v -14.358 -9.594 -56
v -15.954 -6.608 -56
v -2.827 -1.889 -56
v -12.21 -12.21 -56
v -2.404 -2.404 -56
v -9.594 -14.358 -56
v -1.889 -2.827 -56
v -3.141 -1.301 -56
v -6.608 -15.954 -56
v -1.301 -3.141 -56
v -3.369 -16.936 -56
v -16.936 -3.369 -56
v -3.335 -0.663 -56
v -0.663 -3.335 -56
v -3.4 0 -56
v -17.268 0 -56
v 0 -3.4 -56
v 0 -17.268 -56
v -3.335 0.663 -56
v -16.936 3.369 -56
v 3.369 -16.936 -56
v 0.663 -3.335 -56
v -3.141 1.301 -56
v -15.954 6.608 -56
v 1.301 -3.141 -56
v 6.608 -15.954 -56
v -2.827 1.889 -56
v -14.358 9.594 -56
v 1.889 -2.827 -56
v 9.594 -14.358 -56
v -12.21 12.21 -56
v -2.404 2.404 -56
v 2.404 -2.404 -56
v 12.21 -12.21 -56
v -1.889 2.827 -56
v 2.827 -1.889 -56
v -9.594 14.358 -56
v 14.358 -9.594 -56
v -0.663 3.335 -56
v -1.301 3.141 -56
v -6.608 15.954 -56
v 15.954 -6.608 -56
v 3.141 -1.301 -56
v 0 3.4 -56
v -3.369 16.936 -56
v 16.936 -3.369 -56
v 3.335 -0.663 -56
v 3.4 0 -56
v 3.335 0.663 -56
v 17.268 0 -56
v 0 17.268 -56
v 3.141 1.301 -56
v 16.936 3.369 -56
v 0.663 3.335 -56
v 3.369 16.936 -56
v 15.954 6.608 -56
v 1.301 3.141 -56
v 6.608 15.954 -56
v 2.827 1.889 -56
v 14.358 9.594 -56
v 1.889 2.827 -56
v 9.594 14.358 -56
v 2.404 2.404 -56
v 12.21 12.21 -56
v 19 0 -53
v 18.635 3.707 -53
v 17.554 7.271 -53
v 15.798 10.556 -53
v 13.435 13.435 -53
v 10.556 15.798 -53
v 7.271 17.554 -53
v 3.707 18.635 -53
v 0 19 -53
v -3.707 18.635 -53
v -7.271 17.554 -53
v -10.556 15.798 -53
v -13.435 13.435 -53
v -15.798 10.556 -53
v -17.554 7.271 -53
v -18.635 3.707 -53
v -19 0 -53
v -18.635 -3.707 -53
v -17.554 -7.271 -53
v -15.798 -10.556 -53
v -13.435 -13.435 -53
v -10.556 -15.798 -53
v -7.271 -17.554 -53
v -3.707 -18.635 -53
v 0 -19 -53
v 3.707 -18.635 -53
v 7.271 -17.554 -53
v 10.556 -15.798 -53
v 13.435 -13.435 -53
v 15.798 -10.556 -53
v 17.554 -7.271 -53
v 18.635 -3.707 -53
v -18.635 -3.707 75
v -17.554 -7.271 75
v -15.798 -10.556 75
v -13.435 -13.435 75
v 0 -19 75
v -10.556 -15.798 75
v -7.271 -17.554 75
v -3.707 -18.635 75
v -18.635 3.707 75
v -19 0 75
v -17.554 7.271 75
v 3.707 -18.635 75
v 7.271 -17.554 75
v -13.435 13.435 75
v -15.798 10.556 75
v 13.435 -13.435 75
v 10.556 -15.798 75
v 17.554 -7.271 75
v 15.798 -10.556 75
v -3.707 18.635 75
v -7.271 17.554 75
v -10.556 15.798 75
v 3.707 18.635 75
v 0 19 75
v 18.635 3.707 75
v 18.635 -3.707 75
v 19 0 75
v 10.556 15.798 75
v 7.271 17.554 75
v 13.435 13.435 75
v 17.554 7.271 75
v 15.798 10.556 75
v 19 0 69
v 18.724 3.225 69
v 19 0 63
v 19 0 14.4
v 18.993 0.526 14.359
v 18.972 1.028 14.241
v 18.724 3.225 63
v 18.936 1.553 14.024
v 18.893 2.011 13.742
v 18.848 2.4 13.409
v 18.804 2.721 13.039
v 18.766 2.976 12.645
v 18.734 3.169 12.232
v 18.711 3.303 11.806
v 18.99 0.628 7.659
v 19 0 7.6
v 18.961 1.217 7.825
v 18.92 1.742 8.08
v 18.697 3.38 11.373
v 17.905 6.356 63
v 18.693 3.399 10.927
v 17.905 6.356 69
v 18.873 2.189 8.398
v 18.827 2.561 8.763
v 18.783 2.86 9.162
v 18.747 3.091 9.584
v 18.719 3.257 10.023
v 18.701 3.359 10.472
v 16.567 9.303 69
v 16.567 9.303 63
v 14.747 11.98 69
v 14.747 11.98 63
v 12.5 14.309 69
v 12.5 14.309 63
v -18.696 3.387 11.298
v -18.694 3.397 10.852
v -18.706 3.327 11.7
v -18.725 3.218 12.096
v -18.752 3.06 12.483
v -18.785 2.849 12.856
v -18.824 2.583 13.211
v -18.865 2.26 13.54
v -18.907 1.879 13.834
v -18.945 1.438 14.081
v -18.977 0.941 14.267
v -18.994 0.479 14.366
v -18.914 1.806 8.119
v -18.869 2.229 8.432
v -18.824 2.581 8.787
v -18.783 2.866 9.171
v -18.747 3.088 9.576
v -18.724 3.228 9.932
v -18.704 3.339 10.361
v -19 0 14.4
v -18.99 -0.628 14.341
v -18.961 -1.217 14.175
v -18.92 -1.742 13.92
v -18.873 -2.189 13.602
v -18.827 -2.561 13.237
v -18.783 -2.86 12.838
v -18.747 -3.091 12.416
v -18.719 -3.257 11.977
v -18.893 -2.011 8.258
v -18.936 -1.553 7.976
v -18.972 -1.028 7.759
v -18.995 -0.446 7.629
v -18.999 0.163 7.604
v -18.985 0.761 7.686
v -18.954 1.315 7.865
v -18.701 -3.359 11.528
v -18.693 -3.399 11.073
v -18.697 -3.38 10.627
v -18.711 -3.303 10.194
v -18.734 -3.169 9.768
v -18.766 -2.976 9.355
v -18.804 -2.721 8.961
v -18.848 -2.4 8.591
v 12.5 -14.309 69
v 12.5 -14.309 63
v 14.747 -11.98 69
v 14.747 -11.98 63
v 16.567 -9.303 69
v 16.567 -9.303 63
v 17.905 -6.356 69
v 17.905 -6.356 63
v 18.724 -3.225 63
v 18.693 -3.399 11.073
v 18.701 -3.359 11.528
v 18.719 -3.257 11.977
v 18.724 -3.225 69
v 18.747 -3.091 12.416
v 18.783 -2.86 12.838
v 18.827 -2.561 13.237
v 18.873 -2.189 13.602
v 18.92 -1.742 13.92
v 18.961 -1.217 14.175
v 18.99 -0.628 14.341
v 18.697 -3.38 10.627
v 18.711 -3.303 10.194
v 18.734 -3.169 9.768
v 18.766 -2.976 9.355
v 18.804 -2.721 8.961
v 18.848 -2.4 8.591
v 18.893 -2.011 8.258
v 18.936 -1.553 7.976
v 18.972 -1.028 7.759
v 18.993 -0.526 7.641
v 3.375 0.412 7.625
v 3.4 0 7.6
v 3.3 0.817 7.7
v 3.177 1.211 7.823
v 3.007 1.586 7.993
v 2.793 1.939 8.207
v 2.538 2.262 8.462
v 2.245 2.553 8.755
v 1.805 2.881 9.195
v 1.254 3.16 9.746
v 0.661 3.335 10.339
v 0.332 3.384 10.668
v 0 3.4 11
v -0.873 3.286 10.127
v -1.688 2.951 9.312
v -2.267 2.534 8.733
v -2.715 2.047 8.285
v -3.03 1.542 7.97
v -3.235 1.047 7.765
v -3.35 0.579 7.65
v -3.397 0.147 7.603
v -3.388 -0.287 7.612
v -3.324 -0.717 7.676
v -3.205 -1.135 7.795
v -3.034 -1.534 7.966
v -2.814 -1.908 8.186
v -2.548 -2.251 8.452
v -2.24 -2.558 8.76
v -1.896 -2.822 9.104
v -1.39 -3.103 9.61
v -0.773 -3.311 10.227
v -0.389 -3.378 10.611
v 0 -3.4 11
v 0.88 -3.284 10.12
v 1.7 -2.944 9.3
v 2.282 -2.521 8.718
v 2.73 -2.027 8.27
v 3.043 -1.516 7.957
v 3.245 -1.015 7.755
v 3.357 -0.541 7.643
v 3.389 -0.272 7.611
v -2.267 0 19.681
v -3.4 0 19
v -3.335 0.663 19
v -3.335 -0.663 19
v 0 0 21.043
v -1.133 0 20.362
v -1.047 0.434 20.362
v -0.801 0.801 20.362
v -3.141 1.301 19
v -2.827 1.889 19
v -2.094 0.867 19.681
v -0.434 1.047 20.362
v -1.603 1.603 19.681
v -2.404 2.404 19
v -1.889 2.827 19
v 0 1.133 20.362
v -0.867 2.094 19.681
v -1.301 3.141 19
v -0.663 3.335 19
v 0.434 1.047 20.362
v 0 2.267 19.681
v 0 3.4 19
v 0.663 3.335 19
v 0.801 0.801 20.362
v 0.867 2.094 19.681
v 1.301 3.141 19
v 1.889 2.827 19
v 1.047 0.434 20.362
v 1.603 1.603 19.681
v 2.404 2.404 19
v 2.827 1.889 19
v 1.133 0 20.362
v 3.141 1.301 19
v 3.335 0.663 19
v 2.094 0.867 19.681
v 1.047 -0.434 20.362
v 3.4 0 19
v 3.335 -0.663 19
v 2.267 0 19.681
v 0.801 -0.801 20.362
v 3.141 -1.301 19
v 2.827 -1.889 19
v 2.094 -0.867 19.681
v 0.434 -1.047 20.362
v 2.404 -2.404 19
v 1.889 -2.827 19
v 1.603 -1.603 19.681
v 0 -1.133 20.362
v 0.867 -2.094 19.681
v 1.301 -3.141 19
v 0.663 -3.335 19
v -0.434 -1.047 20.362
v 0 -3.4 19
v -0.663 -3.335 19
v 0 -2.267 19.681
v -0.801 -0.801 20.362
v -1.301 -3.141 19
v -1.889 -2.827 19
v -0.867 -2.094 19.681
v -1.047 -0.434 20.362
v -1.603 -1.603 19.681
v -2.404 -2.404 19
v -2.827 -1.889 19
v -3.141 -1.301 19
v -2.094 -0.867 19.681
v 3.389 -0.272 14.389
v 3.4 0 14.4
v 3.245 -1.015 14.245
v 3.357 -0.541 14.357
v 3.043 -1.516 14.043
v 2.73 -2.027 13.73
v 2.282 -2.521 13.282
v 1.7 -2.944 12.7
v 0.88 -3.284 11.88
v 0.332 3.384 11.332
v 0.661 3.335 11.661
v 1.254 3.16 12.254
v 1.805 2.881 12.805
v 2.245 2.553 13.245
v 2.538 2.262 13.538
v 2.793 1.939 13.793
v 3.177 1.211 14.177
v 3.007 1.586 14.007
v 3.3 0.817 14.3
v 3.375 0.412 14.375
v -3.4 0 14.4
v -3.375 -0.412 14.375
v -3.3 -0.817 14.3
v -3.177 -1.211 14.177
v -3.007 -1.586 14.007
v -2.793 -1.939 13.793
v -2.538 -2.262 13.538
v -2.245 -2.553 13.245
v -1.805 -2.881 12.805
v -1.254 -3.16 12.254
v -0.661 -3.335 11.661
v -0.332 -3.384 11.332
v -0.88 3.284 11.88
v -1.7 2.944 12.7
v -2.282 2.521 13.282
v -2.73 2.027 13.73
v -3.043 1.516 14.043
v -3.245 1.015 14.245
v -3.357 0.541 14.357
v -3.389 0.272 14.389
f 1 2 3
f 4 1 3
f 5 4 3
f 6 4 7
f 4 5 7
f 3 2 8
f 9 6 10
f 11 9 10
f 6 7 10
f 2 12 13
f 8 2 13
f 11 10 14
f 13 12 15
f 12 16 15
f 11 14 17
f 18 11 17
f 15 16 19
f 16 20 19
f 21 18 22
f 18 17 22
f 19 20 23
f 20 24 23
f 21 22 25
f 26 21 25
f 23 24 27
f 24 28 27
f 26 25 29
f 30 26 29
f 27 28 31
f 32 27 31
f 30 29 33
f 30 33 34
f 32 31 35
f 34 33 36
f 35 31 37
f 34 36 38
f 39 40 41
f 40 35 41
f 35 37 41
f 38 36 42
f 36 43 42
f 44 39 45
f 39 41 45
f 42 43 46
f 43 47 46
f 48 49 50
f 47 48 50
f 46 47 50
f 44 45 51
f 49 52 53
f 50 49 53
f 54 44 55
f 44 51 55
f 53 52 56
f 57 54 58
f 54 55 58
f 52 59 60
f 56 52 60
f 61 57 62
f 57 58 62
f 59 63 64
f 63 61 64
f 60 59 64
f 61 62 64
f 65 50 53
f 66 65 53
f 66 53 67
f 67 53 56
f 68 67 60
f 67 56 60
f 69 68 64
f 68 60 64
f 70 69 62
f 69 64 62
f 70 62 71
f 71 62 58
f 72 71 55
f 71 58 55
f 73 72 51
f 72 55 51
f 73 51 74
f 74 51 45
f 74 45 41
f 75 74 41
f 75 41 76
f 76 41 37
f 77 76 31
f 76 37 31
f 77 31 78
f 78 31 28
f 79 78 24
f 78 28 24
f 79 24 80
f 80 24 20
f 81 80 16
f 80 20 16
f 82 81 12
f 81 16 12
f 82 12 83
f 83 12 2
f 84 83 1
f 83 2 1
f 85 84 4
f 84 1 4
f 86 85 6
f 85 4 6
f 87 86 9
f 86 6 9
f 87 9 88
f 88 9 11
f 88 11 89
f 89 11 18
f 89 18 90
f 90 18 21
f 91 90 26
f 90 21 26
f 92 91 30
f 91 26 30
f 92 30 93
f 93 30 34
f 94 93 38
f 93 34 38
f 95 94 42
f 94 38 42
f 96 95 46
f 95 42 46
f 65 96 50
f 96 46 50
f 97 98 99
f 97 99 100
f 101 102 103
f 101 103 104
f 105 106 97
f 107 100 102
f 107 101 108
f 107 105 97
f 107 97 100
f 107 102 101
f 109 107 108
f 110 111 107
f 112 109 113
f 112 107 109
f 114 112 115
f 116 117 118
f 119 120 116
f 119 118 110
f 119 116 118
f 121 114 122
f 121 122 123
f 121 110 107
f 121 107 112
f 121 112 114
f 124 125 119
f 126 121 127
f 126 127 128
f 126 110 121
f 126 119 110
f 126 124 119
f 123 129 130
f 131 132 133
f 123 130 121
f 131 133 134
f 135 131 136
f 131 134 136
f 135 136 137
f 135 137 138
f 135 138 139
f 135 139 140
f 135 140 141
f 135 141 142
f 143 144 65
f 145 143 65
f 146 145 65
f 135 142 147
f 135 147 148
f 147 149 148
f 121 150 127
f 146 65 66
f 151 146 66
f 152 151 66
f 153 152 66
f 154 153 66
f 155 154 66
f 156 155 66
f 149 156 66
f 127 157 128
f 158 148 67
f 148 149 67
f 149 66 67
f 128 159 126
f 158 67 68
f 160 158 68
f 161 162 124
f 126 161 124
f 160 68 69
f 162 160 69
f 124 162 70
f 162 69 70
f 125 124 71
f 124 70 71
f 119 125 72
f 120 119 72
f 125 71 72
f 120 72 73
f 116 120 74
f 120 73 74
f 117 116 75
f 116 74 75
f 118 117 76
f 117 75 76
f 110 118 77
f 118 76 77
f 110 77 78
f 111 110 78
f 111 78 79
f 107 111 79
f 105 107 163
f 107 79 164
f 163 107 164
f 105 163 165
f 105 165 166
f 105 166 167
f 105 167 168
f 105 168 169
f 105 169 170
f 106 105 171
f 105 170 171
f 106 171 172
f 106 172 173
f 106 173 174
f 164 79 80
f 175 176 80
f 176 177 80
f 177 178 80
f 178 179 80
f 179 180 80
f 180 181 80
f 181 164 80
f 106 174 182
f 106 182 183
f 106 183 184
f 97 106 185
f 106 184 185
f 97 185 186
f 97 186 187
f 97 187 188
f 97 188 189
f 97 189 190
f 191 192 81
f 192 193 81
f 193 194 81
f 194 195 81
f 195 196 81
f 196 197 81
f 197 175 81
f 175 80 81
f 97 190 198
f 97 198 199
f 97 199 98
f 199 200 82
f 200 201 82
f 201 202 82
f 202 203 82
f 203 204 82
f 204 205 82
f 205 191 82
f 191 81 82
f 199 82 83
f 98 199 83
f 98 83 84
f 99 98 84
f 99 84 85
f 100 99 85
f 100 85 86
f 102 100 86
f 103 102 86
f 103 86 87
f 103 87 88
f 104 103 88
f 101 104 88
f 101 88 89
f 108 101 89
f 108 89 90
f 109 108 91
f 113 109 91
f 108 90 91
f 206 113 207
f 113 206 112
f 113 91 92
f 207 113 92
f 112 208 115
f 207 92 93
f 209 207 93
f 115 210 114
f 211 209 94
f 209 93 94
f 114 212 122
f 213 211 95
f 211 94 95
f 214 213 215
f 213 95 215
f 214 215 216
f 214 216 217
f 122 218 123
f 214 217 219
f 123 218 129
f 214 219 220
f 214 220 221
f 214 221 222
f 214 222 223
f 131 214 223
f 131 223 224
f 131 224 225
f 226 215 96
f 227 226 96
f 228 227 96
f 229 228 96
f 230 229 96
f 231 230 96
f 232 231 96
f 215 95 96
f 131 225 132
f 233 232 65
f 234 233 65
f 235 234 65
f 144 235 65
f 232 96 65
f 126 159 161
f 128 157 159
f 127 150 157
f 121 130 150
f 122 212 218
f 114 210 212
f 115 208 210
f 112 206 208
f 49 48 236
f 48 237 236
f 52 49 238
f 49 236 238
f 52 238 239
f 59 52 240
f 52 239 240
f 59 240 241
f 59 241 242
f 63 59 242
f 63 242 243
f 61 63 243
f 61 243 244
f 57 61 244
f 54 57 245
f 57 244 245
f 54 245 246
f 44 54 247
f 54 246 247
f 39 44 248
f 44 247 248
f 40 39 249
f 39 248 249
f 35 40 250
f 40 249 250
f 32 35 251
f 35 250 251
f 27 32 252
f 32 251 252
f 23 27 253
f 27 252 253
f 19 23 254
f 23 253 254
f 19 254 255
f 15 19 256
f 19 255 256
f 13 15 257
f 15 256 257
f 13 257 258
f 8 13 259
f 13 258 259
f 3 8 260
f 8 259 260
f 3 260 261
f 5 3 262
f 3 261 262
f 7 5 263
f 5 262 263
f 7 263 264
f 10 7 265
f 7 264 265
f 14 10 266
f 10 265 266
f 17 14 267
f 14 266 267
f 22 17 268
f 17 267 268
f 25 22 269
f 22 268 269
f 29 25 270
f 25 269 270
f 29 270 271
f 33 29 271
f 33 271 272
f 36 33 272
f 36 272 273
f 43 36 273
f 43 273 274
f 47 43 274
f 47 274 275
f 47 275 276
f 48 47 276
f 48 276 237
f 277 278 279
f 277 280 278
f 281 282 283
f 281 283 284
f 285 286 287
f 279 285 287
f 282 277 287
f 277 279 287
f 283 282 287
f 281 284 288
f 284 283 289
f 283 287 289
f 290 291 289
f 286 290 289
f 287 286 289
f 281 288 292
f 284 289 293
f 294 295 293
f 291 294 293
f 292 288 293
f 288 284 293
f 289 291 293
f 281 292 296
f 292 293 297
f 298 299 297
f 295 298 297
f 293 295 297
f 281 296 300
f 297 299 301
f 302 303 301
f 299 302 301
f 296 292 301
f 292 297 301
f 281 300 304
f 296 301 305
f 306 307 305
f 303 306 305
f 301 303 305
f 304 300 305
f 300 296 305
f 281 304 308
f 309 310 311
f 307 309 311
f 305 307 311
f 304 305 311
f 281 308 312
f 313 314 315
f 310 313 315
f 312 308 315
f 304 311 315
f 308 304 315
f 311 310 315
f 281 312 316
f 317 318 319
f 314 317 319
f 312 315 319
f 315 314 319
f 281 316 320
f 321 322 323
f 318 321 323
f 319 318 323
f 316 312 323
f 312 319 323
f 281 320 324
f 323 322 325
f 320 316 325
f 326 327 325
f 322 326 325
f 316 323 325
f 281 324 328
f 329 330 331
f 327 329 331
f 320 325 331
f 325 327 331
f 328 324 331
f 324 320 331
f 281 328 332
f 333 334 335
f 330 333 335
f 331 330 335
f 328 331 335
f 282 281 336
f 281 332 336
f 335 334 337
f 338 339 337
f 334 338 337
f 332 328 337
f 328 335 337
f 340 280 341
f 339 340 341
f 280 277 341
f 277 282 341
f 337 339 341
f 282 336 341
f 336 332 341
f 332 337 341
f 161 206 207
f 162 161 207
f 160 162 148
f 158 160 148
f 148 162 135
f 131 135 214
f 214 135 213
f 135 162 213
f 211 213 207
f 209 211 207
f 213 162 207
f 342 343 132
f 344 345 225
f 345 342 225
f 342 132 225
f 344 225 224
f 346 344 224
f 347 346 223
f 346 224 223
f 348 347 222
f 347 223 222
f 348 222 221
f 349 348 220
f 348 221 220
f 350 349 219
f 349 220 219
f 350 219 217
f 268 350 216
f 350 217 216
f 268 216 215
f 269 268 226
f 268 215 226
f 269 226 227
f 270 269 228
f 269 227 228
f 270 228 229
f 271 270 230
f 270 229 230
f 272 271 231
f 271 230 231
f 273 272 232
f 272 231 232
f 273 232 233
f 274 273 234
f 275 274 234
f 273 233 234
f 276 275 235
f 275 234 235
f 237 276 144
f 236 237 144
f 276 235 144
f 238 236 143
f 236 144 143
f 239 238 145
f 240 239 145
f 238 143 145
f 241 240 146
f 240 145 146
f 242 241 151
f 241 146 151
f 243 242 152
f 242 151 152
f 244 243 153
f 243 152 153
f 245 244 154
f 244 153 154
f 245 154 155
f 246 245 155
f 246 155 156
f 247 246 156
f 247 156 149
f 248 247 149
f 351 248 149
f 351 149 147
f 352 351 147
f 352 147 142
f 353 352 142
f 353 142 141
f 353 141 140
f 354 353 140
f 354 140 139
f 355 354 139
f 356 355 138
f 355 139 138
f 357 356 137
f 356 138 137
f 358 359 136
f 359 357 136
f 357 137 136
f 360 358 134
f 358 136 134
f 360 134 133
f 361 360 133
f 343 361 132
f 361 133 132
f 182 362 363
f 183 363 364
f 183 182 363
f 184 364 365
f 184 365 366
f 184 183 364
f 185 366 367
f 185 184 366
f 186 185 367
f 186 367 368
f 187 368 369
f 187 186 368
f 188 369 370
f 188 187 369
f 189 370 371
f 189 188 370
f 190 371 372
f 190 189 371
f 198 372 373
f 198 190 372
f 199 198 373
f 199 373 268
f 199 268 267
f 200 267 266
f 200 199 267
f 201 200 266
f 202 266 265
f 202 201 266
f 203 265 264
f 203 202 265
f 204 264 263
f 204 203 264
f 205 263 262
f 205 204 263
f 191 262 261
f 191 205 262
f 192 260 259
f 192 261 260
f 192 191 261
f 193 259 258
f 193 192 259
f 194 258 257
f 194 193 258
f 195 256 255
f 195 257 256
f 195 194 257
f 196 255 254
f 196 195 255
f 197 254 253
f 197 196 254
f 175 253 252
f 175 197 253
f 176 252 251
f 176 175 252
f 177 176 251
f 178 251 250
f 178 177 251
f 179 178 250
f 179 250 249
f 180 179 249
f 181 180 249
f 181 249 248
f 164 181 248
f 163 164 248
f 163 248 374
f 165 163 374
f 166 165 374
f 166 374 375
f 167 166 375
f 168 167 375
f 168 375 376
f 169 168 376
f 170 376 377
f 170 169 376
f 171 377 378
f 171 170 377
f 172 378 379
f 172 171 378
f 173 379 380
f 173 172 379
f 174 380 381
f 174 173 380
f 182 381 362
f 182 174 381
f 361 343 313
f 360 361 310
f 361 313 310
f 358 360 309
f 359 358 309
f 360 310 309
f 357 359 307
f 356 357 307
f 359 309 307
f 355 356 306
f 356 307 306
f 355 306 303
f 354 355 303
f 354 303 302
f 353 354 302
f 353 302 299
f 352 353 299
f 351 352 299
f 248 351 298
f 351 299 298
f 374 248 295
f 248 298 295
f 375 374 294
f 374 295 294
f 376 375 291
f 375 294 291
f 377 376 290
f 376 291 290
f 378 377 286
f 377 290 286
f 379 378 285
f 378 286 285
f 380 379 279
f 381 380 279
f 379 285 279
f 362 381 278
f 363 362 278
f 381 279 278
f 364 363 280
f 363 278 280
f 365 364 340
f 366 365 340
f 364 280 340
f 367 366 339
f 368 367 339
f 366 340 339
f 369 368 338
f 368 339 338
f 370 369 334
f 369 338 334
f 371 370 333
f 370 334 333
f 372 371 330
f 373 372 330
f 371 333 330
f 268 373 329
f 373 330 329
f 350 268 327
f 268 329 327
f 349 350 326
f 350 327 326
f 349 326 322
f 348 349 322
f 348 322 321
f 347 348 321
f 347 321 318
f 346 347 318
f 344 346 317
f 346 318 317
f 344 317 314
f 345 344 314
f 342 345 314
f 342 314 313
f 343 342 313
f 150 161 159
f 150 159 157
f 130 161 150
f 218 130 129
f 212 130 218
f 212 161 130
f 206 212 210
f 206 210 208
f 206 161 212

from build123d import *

# Parameters (mm, degrees)
AUFSATZ_LINEAR_AUSTRAGEN1_DEPTH      = 75
AUFSATZ_LINEAR_AUSTRAGEN1_DEPTH_BACK = 56
SKIZZE1_R                            = 19
M8_TAPPED_HOLE1_D                    = 6.8
M8_TAPPED_HOLE1_DEPTH                = 75
M8_TAPPED_HOLE1_TIP                  = 2.042926105
SKIZZE7_W                            = 3.4
SKIZZE7_H                            = 19
CHAMFER1_SIZE                        = 3
CHAMFER1_SIZE2                       = 1.732050808
CUT_EXTRUDE2_DEPTH                   = 80.668061496
CUT_EXTRUDE2_DEPTH_BACK              = 80.668061496
SKETCH2_W                            = 6.5
SKETCH2_H                            = 6


with BuildPart() as part:
    # Skizze1 → Aufsatz-Linear austragen1 (new, two sides: drawn at the far end of the back side and taken through both)
    with BuildSketch(Plane.XY.offset(-AUFSATZ_LINEAR_AUSTRAGEN1_DEPTH_BACK)):
        Circle(SKIZZE1_R)
    extrude(amount=AUFSATZ_LINEAR_AUSTRAGEN1_DEPTH + AUFSATZ_LINEAR_AUSTRAGEN1_DEPTH_BACK)

    # M8 Tapped Hole1
    with Locations(Plane(origin=(0, 0, -56), x_dir=(-1, 0, 0), z_dir=(0, 0, -1))):
        with Locations((0, 0)):
            Hole(M8_TAPPED_HOLE1_D / 2, depth=M8_TAPPED_HOLE1_DEPTH)
            with Locations((0, 0, -(M8_TAPPED_HOLE1_DEPTH + M8_TAPPED_HOLE1_TIP / 2))):  # 118° drill point
                Cone(0, M8_TAPPED_HOLE1_D / 2, M8_TAPPED_HOLE1_TIP, mode=Mode.SUBTRACT)

    # Skizze7 → Tap Drill for M8 Tap1 (revolve, cut)
    with BuildSketch(Plane(origin=(0, 0, 11), x_dir=(0, 0, 1), z_dir=(0, 1, 0))):
        with Locations((1.7, 9.5)):
            Rectangle(SKIZZE7_W, SKIZZE7_H)
    tap_drill_for_m8_tap1 = revolve(axis=Axis((-6.35, 0, 11), (1, 0, 0)), mode=Mode.SUBTRACT)

    # Spiegeln1: Tap Drill for M8 Tap1 across plane
    add(tap_drill_for_m8_tap1.mirror(Plane(origin=(0, 0, 0), x_dir=(0, 0, 1), z_dir=(1, 0, 0))), mode=Mode.SUBTRACT)

    # Chamfer1
    chamfer1_edges = [part.edges().sort_by_distance(p)[0] for p in [
        (-19, 0, -56),
    ]]
    chamfer1_side = [part.faces().sort_by_distance(p)[0] for p in [
        (-19, 0, -28),
    ]]
    chamfer(chamfer1_edges, length=CHAMFER1_SIZE, length2=CHAMFER1_SIZE2, reference=chamfer1_side[0])

    # Sketch2 → Cut-Extrude2 (cut, two sides: drawn at the far end of the back side and taken through both)
    with BuildSketch(Plane(origin=(0, 0, 0), x_dir=(1, 0, 0), z_dir=(0, 1, 0)).offset(-CUT_EXTRUDE2_DEPTH_BACK)):
        with Locations((15.75, -66)):
            Rectangle(SKETCH2_W, SKETCH2_H)
    extrude(amount=CUT_EXTRUDE2_DEPTH + CUT_EXTRUDE2_DEPTH_BACK, mode=Mode.SUBTRACT)


solid = part.part
